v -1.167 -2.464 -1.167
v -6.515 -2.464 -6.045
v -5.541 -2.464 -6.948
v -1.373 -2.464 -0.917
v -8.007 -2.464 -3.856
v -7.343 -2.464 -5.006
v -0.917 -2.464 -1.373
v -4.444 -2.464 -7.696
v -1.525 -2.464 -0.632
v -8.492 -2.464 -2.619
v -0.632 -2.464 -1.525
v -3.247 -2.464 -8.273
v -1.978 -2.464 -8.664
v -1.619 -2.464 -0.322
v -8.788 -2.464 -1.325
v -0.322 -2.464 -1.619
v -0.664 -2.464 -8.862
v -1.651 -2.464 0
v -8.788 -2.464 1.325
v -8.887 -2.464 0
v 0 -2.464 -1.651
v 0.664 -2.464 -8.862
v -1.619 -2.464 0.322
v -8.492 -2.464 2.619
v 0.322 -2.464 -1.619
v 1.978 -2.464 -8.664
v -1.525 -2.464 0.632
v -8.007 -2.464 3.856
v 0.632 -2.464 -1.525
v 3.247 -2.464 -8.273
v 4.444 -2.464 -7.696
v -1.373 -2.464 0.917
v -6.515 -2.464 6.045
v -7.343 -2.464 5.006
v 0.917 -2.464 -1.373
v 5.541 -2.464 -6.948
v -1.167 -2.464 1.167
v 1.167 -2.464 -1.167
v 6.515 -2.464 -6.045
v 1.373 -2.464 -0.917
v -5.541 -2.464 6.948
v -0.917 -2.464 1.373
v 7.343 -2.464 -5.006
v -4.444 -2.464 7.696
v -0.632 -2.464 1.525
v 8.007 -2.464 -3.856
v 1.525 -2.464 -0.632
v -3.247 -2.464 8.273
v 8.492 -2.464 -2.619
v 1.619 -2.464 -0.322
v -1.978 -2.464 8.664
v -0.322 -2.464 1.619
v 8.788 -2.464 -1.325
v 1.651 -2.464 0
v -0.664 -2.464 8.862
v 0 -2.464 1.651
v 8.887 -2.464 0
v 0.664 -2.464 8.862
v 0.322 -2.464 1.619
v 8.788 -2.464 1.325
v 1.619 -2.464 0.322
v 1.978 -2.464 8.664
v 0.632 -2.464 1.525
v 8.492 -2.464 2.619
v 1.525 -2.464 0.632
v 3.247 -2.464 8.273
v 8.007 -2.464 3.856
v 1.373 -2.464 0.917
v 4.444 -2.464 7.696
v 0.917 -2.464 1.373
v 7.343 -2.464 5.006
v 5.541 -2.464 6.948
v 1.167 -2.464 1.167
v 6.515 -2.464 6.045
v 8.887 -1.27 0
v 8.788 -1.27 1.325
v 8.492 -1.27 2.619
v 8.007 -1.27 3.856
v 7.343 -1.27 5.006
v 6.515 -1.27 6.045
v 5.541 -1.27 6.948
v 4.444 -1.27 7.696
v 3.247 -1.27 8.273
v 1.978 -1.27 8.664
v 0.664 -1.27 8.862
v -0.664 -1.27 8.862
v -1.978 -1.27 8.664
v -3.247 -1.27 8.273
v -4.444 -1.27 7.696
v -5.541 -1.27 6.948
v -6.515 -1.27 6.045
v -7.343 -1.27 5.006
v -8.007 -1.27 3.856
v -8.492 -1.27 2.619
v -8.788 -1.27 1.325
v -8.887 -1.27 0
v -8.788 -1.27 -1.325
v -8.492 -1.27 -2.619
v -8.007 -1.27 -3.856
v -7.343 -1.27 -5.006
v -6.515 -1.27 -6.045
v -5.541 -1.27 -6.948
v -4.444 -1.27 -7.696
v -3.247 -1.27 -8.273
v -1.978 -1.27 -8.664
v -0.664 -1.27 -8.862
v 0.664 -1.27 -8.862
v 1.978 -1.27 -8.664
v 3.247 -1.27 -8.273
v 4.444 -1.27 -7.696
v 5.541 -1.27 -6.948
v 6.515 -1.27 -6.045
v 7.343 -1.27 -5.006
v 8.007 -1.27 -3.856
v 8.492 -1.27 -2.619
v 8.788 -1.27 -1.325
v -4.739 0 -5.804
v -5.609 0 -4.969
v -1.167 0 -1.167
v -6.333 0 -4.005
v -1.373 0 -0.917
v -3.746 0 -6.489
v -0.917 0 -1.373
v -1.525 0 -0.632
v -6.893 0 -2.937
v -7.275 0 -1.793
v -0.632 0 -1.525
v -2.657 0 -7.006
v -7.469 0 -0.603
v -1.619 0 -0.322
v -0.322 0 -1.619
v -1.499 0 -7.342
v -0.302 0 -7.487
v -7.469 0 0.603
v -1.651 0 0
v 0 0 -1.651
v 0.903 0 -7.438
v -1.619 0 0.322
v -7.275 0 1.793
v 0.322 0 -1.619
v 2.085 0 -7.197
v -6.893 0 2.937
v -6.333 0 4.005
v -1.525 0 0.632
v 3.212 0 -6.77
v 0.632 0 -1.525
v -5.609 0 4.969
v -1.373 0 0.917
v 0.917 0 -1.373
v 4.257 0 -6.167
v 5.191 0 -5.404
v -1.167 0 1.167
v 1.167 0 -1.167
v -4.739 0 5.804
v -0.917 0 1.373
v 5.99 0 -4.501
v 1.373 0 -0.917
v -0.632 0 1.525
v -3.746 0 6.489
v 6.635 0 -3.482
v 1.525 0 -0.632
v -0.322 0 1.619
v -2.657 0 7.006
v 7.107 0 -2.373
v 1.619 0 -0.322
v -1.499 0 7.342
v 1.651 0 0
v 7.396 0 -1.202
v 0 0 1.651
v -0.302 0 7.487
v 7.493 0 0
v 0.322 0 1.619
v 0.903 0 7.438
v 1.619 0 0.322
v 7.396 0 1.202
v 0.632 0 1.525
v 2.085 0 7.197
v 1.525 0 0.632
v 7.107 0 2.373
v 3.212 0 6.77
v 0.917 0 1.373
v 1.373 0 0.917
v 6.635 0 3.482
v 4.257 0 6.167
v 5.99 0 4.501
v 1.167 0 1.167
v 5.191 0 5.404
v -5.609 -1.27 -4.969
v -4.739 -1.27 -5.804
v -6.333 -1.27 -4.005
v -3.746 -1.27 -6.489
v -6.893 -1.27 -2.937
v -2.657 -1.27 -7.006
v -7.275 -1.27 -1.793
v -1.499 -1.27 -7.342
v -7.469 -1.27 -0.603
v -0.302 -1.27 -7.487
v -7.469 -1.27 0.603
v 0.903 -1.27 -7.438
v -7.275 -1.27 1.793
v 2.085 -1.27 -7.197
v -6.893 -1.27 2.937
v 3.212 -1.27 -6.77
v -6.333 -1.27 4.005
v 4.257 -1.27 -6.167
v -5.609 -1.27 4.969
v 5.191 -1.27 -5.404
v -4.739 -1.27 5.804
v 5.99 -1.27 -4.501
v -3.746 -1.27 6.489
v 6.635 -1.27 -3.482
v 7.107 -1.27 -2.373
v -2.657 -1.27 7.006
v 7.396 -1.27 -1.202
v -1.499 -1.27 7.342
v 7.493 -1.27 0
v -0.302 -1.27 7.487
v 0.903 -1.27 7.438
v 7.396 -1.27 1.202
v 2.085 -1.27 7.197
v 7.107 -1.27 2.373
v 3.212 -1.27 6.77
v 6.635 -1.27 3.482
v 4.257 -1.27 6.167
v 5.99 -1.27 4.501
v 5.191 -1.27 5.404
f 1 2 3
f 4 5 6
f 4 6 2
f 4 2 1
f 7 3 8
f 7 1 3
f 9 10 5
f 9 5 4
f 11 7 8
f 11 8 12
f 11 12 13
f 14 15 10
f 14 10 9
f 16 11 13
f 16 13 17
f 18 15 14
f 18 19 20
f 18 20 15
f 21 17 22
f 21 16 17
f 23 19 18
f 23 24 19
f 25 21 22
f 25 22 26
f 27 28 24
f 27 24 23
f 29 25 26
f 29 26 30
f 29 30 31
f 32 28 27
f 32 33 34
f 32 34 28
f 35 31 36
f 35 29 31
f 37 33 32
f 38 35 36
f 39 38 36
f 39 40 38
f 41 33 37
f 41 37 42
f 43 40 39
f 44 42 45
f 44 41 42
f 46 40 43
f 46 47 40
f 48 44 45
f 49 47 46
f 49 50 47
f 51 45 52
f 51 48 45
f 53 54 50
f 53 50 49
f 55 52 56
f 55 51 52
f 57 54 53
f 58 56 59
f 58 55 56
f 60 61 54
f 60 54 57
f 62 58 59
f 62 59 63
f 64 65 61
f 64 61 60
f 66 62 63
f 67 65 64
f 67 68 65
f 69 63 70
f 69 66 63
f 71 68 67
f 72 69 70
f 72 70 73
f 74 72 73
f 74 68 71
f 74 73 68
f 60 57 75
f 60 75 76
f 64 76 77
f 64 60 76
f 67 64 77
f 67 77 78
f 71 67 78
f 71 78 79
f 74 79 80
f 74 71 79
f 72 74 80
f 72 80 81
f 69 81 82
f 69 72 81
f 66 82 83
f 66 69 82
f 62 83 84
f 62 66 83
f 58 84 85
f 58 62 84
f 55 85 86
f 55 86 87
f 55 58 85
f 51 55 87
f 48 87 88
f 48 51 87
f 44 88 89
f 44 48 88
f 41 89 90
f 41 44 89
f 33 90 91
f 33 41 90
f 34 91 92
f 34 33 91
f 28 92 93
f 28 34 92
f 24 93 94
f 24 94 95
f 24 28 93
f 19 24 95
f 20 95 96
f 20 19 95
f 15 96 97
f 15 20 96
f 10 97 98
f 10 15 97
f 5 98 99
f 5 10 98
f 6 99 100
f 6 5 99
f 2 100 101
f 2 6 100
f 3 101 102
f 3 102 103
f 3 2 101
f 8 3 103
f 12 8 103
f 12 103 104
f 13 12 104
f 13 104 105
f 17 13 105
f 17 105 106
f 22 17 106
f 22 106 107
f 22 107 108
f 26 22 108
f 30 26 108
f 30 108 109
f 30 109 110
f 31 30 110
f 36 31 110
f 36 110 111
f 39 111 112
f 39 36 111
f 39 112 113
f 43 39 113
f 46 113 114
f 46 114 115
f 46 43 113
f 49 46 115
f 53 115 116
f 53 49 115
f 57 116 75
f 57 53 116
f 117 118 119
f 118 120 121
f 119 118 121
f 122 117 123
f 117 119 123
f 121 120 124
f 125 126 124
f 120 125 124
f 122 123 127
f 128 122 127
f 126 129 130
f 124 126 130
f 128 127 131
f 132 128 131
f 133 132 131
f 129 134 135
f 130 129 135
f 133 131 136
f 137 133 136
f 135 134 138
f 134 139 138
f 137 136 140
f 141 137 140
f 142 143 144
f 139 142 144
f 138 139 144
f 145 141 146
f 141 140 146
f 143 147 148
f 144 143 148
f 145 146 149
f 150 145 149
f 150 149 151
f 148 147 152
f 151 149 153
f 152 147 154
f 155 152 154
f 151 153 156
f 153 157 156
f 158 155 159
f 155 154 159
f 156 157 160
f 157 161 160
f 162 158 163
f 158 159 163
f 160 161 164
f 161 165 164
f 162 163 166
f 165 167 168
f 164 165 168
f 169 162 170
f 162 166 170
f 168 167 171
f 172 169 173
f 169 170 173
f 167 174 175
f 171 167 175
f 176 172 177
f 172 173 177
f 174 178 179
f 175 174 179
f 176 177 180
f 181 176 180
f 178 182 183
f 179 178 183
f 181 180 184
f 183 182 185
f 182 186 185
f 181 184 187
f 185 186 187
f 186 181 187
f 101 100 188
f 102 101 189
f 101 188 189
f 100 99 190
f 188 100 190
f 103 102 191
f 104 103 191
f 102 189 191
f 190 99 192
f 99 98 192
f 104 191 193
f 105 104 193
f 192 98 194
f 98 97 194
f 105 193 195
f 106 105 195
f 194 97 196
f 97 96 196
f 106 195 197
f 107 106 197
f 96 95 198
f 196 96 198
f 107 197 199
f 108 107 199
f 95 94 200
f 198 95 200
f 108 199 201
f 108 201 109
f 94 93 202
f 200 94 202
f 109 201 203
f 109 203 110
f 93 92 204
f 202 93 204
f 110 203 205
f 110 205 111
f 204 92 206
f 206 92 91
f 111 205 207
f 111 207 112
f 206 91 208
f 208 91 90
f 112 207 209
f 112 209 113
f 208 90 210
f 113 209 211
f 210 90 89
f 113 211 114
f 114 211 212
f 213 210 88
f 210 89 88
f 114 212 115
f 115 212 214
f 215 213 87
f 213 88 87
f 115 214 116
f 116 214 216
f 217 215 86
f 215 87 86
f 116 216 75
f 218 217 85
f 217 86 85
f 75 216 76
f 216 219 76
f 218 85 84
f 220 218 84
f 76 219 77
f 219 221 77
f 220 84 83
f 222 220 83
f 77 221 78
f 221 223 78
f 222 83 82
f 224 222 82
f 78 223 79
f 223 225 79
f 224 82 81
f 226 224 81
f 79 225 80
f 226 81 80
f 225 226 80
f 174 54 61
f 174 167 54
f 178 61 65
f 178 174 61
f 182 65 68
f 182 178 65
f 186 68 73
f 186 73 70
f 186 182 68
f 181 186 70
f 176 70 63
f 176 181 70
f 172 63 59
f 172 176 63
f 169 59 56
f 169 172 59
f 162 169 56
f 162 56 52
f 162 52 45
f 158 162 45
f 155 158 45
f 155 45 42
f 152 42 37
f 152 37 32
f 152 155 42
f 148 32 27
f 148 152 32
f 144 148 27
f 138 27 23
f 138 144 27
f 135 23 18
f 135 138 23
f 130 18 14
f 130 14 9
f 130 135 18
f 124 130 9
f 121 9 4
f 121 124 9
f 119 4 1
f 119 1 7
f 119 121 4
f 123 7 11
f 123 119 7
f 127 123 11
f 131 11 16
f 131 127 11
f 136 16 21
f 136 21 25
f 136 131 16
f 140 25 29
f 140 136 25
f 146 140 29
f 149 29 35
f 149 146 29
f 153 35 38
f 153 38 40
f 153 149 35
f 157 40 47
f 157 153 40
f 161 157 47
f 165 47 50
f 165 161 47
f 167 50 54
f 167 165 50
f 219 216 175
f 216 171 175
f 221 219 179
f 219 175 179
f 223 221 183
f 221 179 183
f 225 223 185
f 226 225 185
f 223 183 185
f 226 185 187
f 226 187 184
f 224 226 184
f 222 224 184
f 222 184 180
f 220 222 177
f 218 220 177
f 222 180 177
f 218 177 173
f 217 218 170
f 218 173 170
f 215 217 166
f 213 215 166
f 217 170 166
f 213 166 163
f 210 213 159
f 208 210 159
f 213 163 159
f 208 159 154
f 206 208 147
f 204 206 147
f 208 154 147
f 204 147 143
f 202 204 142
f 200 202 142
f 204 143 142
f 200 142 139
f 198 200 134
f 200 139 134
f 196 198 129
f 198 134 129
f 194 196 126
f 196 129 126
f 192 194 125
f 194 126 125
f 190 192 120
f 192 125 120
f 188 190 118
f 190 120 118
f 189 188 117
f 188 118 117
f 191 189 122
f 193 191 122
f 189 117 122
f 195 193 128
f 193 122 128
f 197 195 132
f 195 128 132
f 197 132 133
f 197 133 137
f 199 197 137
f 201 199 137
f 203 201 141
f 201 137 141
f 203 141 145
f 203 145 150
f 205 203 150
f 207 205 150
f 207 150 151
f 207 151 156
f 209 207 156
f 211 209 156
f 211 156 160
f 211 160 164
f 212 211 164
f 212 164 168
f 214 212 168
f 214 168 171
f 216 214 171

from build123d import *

# Parameters (mm, degrees)
F0_R     = 7.493
F0_R_2   = 1.651
F1_DEPTH = 1.1938
F2_DEPTH = 1.27
F3_R     = 8.8870084673
F3_R_2   = 7.493
F4_DEPTH = 1.1938


with BuildPart() as f1:
    # F0 (on Front) → F1 (new body)
    with BuildSketch(Plane.XZ):
        Circle(F0_R)
        Circle(F0_R_2, mode=Mode.SUBTRACT)
    extrude(amount=F1_DEPTH)

    # F2 (add): a face of the model
    f2_faces = [f1.faces().sort_by_distance(p)[0] for p in [
        (-7.2810659555, -1.1938, 0),
    ]]
    extrude(f2_faces, amount=F2_DEPTH)

    # F3 (on face) → F4 (join)
    with BuildSketch(Plane.XZ.offset(2.4638)):
        Circle(F3_R)
        Circle(F3_R_2, mode=Mode.SUBTRACT)
    extrude(amount=-F4_DEPTH)


solid = f1.part
